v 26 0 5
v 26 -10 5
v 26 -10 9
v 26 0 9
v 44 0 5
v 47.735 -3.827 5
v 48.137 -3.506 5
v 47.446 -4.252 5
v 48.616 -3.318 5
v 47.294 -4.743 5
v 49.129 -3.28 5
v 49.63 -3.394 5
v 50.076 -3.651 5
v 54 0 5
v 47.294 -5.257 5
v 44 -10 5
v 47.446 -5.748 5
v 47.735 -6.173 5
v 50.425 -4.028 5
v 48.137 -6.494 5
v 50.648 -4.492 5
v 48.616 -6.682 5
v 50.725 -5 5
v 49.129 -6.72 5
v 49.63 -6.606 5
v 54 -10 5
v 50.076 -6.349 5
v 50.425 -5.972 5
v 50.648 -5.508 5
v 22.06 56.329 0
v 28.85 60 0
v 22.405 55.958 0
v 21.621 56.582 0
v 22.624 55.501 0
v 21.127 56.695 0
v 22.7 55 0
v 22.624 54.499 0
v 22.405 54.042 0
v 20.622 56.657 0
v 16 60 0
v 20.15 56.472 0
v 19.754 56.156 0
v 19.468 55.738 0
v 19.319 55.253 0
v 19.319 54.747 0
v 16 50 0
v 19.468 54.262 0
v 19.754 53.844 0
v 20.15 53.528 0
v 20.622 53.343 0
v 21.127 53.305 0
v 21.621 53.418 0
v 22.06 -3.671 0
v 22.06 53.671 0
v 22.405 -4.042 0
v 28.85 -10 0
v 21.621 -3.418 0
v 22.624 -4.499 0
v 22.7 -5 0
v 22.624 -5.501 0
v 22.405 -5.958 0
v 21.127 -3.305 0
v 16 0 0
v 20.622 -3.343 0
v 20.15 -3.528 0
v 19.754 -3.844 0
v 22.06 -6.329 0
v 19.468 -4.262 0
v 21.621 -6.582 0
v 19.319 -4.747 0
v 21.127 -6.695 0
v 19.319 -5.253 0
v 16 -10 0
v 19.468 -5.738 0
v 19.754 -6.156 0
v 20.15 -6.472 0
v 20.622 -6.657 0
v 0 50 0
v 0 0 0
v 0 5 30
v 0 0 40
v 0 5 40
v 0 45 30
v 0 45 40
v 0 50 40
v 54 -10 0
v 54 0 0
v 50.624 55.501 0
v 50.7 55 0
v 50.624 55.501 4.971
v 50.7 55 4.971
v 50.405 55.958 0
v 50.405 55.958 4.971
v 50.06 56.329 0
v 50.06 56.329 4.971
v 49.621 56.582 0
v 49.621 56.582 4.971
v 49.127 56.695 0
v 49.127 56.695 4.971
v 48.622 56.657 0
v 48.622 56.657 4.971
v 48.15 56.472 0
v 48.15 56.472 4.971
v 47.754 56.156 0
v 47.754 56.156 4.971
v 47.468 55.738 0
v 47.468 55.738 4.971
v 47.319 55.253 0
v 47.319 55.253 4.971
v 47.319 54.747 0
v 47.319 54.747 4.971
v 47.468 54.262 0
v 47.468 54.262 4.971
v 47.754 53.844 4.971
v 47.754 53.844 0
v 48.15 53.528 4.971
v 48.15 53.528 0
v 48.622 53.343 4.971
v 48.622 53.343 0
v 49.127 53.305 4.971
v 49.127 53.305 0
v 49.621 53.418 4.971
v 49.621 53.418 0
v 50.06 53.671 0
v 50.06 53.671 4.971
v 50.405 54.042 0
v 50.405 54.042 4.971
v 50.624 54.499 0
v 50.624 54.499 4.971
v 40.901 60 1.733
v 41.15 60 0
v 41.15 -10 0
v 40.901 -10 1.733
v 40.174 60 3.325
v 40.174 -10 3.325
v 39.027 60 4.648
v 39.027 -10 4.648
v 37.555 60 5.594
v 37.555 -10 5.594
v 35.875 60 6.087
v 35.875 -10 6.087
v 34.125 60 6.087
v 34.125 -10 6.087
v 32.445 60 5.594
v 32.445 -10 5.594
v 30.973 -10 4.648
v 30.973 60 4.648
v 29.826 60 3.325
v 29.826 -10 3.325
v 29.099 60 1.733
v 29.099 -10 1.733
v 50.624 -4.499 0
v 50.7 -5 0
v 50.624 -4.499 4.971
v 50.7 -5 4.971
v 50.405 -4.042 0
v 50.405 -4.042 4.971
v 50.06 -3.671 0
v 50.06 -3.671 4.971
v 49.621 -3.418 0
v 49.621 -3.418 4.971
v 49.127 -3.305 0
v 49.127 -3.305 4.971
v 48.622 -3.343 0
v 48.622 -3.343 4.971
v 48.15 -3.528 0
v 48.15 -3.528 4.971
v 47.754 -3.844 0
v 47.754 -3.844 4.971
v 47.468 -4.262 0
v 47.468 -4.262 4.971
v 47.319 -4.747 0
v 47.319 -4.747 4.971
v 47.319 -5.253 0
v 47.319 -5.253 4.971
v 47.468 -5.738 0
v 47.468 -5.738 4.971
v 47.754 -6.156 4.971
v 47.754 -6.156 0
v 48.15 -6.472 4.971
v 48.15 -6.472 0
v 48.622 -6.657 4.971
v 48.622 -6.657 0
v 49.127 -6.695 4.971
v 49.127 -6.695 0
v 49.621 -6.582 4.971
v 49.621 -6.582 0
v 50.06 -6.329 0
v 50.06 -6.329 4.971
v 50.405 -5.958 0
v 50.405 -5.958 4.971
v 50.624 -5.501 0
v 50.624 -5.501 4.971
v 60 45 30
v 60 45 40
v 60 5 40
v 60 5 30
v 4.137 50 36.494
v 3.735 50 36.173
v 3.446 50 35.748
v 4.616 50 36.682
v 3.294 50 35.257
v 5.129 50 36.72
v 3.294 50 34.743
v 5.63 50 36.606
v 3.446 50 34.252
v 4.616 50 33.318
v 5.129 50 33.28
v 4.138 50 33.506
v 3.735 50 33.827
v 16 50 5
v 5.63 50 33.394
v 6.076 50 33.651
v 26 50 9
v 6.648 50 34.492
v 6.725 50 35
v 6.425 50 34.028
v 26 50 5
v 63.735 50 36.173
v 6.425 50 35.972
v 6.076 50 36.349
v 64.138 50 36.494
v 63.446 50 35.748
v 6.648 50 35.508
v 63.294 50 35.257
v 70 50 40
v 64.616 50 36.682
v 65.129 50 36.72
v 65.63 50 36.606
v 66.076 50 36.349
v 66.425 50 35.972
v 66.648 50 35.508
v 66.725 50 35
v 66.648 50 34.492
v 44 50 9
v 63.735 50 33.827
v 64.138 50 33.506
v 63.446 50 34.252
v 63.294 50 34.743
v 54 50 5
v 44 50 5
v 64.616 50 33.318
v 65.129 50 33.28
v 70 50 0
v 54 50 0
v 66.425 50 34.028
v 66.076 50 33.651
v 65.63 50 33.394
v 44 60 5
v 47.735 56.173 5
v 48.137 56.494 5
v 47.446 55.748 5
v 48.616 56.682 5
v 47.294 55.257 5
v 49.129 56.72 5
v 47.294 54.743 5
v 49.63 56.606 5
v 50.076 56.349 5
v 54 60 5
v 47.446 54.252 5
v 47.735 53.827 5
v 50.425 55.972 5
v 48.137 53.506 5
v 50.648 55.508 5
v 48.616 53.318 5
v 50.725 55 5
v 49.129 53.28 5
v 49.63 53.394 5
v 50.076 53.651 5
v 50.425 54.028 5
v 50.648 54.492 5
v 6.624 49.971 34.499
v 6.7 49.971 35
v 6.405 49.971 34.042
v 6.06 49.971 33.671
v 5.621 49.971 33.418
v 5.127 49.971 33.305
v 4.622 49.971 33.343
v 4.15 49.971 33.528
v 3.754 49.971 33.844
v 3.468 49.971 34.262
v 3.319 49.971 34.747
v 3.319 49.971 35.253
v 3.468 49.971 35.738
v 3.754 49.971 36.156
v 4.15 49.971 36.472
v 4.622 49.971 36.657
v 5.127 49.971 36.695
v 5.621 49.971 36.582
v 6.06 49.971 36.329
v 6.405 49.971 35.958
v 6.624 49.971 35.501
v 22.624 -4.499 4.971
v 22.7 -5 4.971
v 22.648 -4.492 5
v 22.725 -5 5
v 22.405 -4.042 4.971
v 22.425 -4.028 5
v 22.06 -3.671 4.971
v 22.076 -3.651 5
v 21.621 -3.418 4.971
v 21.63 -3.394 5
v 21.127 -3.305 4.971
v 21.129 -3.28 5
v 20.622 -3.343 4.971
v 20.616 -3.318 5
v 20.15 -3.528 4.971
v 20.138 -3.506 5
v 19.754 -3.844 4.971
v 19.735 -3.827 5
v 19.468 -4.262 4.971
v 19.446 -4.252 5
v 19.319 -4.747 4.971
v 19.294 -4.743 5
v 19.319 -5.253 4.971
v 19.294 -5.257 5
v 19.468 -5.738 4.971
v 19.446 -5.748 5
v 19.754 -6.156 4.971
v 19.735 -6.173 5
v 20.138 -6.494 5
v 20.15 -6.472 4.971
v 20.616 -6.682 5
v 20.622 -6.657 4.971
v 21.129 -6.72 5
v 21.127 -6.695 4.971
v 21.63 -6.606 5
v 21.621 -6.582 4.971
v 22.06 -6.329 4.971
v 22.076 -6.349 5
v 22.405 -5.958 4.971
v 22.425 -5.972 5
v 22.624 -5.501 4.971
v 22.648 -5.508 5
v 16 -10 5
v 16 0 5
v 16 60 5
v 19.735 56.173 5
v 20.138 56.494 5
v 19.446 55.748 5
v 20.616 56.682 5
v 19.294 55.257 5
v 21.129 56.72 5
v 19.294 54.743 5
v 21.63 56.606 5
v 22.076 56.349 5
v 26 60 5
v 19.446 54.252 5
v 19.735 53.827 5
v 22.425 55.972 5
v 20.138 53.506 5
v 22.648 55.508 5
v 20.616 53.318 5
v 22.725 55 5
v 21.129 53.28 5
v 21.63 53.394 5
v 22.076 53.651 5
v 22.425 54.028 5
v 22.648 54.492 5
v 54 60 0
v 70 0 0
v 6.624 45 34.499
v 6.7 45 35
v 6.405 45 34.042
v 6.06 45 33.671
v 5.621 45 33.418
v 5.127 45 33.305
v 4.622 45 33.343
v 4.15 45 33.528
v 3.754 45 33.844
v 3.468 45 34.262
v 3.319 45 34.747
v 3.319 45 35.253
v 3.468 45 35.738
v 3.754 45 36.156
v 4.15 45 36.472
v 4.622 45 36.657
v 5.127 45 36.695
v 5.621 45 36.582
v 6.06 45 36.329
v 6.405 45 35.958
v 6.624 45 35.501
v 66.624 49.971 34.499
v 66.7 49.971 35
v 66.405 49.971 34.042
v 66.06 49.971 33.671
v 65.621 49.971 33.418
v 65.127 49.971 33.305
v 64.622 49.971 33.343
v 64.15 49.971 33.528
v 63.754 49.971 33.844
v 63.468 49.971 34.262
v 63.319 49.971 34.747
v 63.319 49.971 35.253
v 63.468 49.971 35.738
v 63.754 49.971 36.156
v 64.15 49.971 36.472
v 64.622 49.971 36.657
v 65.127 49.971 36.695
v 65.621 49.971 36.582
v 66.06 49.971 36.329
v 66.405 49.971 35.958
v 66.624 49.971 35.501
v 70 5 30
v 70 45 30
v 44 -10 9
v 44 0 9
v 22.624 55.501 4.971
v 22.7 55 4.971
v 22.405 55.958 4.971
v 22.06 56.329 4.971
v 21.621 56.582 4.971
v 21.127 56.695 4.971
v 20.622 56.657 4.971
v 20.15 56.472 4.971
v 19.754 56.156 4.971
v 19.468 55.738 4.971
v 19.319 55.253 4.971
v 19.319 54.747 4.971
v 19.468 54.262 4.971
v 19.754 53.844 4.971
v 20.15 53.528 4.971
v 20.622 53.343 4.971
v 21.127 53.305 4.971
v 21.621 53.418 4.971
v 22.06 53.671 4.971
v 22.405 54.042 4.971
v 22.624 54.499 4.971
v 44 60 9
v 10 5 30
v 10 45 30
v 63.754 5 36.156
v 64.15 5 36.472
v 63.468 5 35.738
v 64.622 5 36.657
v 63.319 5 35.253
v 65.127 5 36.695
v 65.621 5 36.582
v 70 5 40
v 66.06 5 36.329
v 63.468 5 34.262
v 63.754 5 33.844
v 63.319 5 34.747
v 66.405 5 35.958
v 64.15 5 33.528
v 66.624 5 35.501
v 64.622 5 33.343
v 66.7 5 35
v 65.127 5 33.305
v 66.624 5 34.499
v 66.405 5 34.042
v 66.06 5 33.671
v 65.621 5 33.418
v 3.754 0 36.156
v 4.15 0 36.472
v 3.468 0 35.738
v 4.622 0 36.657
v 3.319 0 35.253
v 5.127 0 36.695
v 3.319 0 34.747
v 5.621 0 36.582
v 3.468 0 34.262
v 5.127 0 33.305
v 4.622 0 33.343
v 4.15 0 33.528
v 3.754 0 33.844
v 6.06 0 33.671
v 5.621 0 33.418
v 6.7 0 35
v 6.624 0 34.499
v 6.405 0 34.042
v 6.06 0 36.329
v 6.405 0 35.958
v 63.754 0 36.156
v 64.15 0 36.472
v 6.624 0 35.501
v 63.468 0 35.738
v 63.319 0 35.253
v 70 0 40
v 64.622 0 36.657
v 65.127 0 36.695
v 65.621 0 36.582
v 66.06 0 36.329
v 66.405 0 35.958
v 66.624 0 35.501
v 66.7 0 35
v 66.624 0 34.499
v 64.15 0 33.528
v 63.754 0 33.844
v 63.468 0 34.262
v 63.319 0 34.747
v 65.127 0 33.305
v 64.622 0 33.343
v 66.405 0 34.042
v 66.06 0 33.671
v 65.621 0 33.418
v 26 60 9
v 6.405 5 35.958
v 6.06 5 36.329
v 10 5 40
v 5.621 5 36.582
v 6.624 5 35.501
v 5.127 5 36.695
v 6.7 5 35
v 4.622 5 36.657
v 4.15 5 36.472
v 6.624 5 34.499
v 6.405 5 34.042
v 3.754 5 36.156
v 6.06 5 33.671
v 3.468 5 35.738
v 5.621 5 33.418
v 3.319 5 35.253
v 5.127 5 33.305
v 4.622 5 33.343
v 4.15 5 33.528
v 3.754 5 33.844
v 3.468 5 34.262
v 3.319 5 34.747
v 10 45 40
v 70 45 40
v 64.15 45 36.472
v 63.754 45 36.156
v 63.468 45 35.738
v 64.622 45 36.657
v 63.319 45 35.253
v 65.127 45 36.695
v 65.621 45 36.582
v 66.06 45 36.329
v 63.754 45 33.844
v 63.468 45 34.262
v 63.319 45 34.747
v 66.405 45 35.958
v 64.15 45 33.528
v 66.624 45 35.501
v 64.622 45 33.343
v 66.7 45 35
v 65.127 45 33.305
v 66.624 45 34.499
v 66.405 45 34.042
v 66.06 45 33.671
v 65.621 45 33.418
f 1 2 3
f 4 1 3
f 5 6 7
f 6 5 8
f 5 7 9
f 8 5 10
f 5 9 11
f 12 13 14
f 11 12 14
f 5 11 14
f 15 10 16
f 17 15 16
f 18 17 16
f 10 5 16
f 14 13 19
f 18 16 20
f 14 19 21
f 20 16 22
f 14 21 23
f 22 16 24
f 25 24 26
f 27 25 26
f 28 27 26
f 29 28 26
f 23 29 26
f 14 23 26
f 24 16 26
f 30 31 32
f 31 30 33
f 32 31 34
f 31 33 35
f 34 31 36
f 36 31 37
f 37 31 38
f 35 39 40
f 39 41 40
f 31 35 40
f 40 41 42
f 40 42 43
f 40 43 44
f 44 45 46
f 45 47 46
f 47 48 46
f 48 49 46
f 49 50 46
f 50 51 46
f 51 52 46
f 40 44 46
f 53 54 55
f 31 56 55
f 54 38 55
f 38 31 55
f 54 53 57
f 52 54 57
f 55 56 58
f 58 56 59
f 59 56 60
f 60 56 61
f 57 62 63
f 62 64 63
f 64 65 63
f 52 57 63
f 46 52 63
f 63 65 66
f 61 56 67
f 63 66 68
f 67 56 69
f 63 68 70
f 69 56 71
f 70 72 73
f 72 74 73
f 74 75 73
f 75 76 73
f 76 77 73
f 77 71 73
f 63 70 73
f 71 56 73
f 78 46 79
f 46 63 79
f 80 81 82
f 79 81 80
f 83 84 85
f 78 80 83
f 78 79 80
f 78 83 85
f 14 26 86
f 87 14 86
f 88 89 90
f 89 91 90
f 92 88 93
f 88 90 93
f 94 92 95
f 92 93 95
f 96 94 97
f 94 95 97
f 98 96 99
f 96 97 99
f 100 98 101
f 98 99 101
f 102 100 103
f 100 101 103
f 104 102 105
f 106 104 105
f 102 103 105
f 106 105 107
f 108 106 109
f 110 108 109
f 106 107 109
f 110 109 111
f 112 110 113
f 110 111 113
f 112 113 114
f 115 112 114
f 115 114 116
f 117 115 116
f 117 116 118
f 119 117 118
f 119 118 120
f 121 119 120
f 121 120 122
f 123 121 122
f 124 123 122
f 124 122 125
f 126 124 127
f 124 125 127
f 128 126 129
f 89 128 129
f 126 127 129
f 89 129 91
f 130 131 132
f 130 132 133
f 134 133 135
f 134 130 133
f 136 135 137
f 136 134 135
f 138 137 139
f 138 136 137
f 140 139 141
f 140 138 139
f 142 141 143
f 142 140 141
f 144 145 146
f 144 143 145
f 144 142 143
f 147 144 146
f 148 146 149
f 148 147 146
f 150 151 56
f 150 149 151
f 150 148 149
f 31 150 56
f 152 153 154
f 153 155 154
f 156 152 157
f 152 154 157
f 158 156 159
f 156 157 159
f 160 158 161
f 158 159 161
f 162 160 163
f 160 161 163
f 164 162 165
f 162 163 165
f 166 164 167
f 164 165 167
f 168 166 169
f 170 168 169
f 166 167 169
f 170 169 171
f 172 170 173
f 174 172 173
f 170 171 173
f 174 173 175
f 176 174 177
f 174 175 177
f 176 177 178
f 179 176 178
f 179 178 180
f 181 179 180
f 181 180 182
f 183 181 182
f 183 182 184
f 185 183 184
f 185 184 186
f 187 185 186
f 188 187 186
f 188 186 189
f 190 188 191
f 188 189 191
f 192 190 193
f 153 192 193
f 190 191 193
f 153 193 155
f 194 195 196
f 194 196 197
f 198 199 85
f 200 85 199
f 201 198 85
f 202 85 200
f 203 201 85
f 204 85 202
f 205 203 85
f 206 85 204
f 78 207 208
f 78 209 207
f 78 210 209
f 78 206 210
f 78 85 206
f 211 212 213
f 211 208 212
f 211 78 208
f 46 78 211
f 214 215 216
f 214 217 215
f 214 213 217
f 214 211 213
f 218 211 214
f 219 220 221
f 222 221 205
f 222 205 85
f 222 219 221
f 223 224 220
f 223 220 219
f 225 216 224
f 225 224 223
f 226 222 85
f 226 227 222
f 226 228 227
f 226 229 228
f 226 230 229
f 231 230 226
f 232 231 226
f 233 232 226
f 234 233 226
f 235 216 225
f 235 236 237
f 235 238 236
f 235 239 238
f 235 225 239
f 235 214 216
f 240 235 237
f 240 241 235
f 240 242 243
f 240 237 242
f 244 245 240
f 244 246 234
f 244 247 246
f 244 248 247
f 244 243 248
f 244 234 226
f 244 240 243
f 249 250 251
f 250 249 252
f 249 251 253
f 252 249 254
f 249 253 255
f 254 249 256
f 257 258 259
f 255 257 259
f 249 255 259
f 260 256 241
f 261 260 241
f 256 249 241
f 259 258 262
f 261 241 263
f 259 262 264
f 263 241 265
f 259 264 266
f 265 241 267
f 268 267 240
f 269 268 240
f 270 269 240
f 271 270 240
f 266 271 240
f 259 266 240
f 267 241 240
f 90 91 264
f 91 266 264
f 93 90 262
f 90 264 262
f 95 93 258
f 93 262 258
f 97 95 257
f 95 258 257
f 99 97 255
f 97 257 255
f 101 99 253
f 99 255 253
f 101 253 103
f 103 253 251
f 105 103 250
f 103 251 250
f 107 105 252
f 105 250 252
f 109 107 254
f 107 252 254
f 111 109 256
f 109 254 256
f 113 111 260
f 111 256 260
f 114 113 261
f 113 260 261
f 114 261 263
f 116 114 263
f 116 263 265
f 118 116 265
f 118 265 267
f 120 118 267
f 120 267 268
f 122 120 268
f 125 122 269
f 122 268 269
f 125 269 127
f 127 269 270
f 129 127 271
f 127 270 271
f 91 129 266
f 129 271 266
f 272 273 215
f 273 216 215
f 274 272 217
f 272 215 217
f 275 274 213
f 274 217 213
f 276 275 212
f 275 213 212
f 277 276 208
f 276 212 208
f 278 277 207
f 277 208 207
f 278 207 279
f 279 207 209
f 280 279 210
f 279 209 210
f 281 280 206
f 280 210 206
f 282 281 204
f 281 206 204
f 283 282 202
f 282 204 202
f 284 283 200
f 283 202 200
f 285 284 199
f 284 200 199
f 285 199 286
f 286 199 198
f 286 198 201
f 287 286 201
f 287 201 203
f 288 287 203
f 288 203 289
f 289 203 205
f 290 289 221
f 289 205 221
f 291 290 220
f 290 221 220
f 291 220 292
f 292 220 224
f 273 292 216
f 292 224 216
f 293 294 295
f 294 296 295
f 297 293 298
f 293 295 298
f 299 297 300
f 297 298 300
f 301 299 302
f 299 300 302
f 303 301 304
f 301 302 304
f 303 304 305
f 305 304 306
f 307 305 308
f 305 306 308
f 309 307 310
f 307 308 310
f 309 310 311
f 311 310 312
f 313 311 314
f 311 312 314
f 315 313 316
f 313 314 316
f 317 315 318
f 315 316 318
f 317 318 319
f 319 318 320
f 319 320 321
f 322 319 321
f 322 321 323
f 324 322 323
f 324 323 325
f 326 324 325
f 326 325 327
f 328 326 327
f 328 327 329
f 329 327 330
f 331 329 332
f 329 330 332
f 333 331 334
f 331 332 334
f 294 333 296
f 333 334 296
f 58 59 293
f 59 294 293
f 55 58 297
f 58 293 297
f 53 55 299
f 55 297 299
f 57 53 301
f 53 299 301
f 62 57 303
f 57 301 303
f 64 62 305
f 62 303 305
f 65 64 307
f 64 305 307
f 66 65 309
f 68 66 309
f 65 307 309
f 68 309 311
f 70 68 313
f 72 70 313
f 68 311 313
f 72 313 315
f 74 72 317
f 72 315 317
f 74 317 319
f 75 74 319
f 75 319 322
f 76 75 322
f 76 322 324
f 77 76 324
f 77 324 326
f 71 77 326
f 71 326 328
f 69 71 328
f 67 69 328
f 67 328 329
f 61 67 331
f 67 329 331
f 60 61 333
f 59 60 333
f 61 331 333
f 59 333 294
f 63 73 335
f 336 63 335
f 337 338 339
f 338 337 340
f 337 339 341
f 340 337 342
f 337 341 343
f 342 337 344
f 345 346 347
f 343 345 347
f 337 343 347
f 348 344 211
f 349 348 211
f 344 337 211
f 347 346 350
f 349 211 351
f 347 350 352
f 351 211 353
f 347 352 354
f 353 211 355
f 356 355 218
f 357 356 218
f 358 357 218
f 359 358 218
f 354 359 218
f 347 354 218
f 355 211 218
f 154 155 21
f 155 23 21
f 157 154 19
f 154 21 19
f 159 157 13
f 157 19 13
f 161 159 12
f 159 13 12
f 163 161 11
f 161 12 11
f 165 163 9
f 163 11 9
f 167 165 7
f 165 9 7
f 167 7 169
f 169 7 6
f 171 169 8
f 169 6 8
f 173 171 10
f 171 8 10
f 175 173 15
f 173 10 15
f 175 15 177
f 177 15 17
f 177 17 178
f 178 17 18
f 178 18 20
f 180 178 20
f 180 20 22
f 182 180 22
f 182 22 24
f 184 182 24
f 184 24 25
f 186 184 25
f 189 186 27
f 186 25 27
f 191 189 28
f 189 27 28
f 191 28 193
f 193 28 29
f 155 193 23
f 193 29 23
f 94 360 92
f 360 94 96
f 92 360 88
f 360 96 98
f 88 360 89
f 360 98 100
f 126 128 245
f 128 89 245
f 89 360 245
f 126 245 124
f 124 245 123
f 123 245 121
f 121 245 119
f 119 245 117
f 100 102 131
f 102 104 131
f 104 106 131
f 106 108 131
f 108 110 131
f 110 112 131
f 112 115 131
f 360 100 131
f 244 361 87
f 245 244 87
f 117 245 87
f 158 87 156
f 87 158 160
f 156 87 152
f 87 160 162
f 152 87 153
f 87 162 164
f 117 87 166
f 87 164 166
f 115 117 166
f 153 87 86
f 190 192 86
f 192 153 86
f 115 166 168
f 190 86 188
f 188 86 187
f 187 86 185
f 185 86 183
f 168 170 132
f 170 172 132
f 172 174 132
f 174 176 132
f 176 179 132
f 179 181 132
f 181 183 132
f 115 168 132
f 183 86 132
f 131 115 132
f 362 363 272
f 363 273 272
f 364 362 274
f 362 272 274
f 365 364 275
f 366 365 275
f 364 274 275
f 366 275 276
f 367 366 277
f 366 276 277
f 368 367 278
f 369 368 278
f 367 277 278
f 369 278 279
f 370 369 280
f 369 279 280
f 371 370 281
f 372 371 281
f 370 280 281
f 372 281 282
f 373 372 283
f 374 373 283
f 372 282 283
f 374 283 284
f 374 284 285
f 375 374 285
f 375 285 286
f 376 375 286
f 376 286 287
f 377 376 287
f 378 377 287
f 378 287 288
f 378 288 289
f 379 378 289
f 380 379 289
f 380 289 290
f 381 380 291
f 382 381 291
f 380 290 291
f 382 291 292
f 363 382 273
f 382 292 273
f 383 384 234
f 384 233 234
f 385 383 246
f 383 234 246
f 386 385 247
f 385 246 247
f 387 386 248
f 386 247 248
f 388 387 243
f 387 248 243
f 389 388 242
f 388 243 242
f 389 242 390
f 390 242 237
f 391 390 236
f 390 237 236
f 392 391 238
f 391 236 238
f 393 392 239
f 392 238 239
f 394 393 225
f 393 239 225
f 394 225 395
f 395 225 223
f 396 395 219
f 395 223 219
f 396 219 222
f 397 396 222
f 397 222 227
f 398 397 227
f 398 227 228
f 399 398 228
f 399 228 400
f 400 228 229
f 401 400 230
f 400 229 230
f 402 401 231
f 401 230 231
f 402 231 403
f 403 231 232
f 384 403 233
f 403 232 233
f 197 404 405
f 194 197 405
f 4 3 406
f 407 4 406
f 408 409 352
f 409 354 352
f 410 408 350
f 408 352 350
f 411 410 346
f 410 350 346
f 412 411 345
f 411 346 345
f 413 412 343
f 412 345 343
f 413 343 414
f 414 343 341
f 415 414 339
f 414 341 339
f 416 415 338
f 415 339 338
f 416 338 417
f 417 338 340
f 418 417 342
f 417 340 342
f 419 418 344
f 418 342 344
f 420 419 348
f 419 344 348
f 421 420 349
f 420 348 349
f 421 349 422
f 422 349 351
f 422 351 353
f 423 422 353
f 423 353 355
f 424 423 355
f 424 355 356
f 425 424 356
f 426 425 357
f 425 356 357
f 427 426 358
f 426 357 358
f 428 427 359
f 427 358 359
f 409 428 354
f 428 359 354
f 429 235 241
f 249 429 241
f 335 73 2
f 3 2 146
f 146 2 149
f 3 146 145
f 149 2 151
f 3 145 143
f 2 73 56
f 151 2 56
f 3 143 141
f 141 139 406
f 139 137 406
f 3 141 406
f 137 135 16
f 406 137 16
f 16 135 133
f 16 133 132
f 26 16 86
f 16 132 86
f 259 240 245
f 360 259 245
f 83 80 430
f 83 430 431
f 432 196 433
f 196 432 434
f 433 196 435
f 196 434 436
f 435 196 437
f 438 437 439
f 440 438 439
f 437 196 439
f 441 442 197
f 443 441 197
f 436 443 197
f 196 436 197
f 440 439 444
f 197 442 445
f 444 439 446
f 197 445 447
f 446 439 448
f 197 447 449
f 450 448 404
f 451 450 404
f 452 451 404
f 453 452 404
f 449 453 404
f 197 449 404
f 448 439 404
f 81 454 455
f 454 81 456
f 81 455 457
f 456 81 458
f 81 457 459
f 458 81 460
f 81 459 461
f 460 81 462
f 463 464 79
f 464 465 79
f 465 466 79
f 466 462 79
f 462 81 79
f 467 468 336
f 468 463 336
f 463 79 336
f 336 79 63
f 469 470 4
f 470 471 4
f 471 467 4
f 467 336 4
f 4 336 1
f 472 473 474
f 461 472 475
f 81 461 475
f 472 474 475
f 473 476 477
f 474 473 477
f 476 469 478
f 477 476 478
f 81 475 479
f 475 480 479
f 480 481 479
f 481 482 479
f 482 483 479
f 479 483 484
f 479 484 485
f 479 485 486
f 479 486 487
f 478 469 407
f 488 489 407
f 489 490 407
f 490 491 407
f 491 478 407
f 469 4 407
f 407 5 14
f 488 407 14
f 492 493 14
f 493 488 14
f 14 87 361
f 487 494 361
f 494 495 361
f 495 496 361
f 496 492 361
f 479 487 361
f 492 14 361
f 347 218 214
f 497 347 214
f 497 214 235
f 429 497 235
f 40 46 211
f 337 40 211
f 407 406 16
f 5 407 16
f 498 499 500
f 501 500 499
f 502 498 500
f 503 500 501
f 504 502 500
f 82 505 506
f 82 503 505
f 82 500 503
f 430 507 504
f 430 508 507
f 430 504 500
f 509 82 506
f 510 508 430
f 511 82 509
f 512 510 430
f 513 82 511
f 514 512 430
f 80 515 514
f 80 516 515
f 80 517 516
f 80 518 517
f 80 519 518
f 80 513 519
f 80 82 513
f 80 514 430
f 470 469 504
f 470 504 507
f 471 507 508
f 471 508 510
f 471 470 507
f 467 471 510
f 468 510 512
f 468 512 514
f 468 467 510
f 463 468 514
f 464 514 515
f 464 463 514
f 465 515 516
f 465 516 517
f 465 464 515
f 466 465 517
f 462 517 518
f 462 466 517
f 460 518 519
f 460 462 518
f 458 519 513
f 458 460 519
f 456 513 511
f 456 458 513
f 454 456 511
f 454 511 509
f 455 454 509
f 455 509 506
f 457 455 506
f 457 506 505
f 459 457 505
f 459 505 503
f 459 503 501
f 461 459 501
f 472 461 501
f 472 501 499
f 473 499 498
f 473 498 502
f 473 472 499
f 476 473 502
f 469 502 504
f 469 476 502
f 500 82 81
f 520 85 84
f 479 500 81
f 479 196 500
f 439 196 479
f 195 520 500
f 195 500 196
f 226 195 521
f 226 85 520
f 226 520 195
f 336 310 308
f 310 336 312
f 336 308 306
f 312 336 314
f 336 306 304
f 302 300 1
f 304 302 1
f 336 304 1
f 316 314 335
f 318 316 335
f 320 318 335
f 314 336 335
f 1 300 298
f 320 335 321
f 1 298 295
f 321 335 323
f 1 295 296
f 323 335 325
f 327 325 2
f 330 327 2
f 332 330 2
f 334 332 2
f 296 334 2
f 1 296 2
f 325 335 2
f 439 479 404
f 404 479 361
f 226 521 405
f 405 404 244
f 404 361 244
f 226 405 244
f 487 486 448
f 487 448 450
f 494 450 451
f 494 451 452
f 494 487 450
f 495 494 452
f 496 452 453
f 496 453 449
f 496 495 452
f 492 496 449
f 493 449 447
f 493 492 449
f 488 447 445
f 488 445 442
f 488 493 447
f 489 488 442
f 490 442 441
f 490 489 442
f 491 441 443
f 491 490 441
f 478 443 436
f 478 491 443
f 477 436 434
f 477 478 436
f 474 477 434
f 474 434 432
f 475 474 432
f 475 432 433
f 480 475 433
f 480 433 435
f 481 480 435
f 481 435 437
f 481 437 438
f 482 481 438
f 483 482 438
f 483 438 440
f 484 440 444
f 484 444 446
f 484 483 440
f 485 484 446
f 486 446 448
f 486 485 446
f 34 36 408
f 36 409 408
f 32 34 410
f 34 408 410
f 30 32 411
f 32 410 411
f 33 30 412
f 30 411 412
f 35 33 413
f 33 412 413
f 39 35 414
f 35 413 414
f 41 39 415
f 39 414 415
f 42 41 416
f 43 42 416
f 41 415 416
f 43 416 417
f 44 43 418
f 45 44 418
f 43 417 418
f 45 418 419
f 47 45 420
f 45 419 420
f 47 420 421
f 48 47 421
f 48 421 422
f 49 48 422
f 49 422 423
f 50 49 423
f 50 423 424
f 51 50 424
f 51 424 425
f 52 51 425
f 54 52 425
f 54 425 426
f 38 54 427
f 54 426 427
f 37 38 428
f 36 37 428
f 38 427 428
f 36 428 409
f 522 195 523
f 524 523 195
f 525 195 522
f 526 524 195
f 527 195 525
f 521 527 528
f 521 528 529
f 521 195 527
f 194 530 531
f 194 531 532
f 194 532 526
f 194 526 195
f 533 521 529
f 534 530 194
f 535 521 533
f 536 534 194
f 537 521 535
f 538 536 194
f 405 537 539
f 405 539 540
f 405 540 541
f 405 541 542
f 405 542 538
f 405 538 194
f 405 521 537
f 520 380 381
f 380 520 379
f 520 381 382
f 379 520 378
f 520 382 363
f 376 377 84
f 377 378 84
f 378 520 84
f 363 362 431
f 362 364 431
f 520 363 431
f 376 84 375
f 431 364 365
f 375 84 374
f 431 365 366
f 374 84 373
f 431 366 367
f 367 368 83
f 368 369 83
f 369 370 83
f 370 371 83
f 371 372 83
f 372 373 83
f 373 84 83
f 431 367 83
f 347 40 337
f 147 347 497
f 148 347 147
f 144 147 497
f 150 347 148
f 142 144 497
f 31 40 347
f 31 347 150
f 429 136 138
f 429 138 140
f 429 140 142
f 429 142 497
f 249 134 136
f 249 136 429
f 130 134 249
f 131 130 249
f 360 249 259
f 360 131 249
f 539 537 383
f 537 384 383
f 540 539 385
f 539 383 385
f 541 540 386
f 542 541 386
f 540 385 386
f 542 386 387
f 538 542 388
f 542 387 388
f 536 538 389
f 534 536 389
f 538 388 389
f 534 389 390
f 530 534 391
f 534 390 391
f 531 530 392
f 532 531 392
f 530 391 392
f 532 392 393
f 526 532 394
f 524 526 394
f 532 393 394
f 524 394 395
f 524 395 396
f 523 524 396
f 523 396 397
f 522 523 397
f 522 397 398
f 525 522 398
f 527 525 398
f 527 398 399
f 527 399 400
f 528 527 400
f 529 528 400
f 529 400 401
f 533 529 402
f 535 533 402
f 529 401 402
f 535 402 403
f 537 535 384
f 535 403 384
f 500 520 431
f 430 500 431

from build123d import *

# Parameters (mm, degrees)
SKETCH_1_W                 = 70
SKETCH_1_H                 = 50
EXTRUDE_1_DEPTH            = 40
EXTRUDE_2_DEPTH            = 10
EXTRUDE_2_DEPTH_BACK       = 60
CUT_EXTRUDE_1_REACH        = 108.771
SKETCH_7_W                 = 10
SKETCH_7_H                 = 40
CUT_EXTRUDE_2_DEPTH        = 10
HOLE_WIZARD_M3_2_OUTLINE_R = 1.7
HOLE_WIZARD_M3_2_DEPTH     = 5


# Read off the part's stored shape, not the designer's step: M3 すきま穴1, M3 すきま穴2
with BuildPart() as part:
    # ｽｹｯﾁ1 → ﾎﾞｽ - 押し出し1 (new body)
    with BuildSketch(Plane.XY):
        with Locations((35, 25)):
            Rectangle(SKETCH_1_W, SKETCH_1_H)
    extrude(amount=EXTRUDE_1_DEPTH)

    # ｽｹｯﾁ2 → ﾎﾞｽ - 押し出し2 (add, two sides: drawn at the far end of the back side and taken through both)
    with BuildSketch(Plane(origin=(0, 50, 0), x_dir=(1, 0, 0), z_dir=(0, 1, 0)).offset(-EXTRUDE_2_DEPTH_BACK)):
        Polygon((16, 0), (16, -5), (26, -5), (26, -9), (44, -9), (44, -5), (54, -5), (54, 0), align=None)
    extrude(amount=EXTRUDE_2_DEPTH + EXTRUDE_2_DEPTH_BACK)

    # M3 すきま穴1 outline → M3 すきま穴1 (revolve, cut)
    with BuildSketch(Plane(origin=(49, -5, 0), x_dir=(1, 0, 0), z_dir=(0, -1, 0))):
        Polygon((0, 0), (1.7, 0), (1.7, 4.97124079), (1.725, 5), (0, 5), align=None)
    revolve(axis=Axis((49, -5, 0), (0, 0, 1)), mode=Mode.SUBTRACT)

    # Hole Wizard M3 _1 2 outline → Hole Wizard M3 _1 2 (revolve, cut)
    with BuildSketch(Plane(origin=(21, -5, 0), x_dir=(1, 0, 0), z_dir=(0, -1, 0))):
        Polygon((0, 0), (1.7, 0), (1.7, 4.97124079), (1.725, 5), (0, 5), align=None)
    revolve(axis=Axis((21, -5, 0), (0, 0, 1)), mode=Mode.SUBTRACT)

    # Hole Wizard M3 _1 3 outline → Hole Wizard M3 _1 3 (revolve, cut)
    with BuildSketch(Plane(origin=(49, 55, 0), x_dir=(1, 0, 0), z_dir=(0, -1, 0))):
        Polygon((0, 0), (1.7, 0), (1.7, 4.97124079), (1.725, 5), (0, 5), align=None)
    revolve(axis=Axis((49, 55, 0), (0, 0, 1)), mode=Mode.SUBTRACT)

    # Hole Wizard M3 _1 4 outline → Hole Wizard M3 _1 4 (revolve, cut)
    with BuildSketch(Plane(origin=(21, 55, 0), x_dir=(1, 0, 0), z_dir=(0, -1, 0))):
        Polygon((0, 0), (1.7, 0), (1.7, 4.97124079), (1.725, 5), (0, 5), align=None)
    revolve(axis=Axis((21, 55, 0), (0, 0, 1)), mode=Mode.SUBTRACT)

    # ｽｹｯﾁ6 → ｶｯﾄ - 押し出し1 (cut, up to next)
    with BuildSketch(Plane(origin=(0, 60, 0), x_dir=(1, 0, 0), z_dir=(0, 1, 0)), mode=Mode.PRIVATE) as cut_extrude_1_sk1:
        with BuildLine():
            Line((28.85, 0), (41.15, 0))
            ThreePointArc((41.15, 0), (35, -6.15), (28.85, 0))
        make_face()
    cut_extrude_1_tool1 = extrude(cut_extrude_1_sk1.sketch, amount=-CUT_EXTRUDE_1_REACH, mode=Mode.PRIVATE) & part.part
    add(cut_extrude_1_tool1.solids().sort_by_distance((35, 60, 2.610141))[0], mode=Mode.SUBTRACT)

    # ｽｹｯﾁ7 → ｶｯﾄ - 押し出し2 (cut)
    with BuildSketch(Plane(origin=(70, 0, 0), x_dir=(0, 0, -1), z_dir=(1, 0, 0))):
        with Locations((-35, 25)):
            Rectangle(SKETCH_7_W, SKETCH_7_H)
    cut_extrude_2 = extrude(amount=-CUT_EXTRUDE_2_DEPTH, mode=Mode.SUBTRACT)

    # ﾐﾗｰ1: ｶｯﾄ - 押し出し2 across plane
    add(cut_extrude_2.mirror(Plane.ZY.offset(-35)), mode=Mode.SUBTRACT)

    # M3 すきま穴2 outline → M3 すきま穴2 (cut)
    with BuildSketch(Plane(origin=(0, 0, 0), x_dir=(1, 0, 0), z_dir=(0, 1, 0))):
        with Locations((65, -35)):
            Circle(HOLE_WIZARD_M3_2_OUTLINE_R)
        with Locations((5, -35)):
            Circle(HOLE_WIZARD_M3_2_OUTLINE_R)
    extrude(amount=HOLE_WIZARD_M3_2_DEPTH, mode=Mode.SUBTRACT)

    # Hole Wizard M3 _2 2 outline → Hole Wizard M3 _2 2 (revolve, cut)
    with BuildSketch(Plane(origin=(65, 0, 35), x_dir=(1, 0, 0), z_dir=(0, 0, 1))):
        Polygon((1.725, 50), (0, 50), (0, 45), (1.7, 45), (1.7, 49.97124079), align=None)
    revolve(axis=Axis((65, 0, 35), (0, 1, 0)), mode=Mode.SUBTRACT)

    # Hole Wizard M3 _2 3 outline → Hole Wizard M3 _2 3 (revolve, cut)
    with BuildSketch(Plane(origin=(5, 0, 35), x_dir=(1, 0, 0), z_dir=(0, 0, 1))):
        Polygon((0, 45), (1.7, 45), (1.7, 49.97124079), (1.725, 50), (0, 50), align=None)
    revolve(axis=Axis((5, 0, 35), (0, 1, 0)), mode=Mode.SUBTRACT)


solid = part.part
